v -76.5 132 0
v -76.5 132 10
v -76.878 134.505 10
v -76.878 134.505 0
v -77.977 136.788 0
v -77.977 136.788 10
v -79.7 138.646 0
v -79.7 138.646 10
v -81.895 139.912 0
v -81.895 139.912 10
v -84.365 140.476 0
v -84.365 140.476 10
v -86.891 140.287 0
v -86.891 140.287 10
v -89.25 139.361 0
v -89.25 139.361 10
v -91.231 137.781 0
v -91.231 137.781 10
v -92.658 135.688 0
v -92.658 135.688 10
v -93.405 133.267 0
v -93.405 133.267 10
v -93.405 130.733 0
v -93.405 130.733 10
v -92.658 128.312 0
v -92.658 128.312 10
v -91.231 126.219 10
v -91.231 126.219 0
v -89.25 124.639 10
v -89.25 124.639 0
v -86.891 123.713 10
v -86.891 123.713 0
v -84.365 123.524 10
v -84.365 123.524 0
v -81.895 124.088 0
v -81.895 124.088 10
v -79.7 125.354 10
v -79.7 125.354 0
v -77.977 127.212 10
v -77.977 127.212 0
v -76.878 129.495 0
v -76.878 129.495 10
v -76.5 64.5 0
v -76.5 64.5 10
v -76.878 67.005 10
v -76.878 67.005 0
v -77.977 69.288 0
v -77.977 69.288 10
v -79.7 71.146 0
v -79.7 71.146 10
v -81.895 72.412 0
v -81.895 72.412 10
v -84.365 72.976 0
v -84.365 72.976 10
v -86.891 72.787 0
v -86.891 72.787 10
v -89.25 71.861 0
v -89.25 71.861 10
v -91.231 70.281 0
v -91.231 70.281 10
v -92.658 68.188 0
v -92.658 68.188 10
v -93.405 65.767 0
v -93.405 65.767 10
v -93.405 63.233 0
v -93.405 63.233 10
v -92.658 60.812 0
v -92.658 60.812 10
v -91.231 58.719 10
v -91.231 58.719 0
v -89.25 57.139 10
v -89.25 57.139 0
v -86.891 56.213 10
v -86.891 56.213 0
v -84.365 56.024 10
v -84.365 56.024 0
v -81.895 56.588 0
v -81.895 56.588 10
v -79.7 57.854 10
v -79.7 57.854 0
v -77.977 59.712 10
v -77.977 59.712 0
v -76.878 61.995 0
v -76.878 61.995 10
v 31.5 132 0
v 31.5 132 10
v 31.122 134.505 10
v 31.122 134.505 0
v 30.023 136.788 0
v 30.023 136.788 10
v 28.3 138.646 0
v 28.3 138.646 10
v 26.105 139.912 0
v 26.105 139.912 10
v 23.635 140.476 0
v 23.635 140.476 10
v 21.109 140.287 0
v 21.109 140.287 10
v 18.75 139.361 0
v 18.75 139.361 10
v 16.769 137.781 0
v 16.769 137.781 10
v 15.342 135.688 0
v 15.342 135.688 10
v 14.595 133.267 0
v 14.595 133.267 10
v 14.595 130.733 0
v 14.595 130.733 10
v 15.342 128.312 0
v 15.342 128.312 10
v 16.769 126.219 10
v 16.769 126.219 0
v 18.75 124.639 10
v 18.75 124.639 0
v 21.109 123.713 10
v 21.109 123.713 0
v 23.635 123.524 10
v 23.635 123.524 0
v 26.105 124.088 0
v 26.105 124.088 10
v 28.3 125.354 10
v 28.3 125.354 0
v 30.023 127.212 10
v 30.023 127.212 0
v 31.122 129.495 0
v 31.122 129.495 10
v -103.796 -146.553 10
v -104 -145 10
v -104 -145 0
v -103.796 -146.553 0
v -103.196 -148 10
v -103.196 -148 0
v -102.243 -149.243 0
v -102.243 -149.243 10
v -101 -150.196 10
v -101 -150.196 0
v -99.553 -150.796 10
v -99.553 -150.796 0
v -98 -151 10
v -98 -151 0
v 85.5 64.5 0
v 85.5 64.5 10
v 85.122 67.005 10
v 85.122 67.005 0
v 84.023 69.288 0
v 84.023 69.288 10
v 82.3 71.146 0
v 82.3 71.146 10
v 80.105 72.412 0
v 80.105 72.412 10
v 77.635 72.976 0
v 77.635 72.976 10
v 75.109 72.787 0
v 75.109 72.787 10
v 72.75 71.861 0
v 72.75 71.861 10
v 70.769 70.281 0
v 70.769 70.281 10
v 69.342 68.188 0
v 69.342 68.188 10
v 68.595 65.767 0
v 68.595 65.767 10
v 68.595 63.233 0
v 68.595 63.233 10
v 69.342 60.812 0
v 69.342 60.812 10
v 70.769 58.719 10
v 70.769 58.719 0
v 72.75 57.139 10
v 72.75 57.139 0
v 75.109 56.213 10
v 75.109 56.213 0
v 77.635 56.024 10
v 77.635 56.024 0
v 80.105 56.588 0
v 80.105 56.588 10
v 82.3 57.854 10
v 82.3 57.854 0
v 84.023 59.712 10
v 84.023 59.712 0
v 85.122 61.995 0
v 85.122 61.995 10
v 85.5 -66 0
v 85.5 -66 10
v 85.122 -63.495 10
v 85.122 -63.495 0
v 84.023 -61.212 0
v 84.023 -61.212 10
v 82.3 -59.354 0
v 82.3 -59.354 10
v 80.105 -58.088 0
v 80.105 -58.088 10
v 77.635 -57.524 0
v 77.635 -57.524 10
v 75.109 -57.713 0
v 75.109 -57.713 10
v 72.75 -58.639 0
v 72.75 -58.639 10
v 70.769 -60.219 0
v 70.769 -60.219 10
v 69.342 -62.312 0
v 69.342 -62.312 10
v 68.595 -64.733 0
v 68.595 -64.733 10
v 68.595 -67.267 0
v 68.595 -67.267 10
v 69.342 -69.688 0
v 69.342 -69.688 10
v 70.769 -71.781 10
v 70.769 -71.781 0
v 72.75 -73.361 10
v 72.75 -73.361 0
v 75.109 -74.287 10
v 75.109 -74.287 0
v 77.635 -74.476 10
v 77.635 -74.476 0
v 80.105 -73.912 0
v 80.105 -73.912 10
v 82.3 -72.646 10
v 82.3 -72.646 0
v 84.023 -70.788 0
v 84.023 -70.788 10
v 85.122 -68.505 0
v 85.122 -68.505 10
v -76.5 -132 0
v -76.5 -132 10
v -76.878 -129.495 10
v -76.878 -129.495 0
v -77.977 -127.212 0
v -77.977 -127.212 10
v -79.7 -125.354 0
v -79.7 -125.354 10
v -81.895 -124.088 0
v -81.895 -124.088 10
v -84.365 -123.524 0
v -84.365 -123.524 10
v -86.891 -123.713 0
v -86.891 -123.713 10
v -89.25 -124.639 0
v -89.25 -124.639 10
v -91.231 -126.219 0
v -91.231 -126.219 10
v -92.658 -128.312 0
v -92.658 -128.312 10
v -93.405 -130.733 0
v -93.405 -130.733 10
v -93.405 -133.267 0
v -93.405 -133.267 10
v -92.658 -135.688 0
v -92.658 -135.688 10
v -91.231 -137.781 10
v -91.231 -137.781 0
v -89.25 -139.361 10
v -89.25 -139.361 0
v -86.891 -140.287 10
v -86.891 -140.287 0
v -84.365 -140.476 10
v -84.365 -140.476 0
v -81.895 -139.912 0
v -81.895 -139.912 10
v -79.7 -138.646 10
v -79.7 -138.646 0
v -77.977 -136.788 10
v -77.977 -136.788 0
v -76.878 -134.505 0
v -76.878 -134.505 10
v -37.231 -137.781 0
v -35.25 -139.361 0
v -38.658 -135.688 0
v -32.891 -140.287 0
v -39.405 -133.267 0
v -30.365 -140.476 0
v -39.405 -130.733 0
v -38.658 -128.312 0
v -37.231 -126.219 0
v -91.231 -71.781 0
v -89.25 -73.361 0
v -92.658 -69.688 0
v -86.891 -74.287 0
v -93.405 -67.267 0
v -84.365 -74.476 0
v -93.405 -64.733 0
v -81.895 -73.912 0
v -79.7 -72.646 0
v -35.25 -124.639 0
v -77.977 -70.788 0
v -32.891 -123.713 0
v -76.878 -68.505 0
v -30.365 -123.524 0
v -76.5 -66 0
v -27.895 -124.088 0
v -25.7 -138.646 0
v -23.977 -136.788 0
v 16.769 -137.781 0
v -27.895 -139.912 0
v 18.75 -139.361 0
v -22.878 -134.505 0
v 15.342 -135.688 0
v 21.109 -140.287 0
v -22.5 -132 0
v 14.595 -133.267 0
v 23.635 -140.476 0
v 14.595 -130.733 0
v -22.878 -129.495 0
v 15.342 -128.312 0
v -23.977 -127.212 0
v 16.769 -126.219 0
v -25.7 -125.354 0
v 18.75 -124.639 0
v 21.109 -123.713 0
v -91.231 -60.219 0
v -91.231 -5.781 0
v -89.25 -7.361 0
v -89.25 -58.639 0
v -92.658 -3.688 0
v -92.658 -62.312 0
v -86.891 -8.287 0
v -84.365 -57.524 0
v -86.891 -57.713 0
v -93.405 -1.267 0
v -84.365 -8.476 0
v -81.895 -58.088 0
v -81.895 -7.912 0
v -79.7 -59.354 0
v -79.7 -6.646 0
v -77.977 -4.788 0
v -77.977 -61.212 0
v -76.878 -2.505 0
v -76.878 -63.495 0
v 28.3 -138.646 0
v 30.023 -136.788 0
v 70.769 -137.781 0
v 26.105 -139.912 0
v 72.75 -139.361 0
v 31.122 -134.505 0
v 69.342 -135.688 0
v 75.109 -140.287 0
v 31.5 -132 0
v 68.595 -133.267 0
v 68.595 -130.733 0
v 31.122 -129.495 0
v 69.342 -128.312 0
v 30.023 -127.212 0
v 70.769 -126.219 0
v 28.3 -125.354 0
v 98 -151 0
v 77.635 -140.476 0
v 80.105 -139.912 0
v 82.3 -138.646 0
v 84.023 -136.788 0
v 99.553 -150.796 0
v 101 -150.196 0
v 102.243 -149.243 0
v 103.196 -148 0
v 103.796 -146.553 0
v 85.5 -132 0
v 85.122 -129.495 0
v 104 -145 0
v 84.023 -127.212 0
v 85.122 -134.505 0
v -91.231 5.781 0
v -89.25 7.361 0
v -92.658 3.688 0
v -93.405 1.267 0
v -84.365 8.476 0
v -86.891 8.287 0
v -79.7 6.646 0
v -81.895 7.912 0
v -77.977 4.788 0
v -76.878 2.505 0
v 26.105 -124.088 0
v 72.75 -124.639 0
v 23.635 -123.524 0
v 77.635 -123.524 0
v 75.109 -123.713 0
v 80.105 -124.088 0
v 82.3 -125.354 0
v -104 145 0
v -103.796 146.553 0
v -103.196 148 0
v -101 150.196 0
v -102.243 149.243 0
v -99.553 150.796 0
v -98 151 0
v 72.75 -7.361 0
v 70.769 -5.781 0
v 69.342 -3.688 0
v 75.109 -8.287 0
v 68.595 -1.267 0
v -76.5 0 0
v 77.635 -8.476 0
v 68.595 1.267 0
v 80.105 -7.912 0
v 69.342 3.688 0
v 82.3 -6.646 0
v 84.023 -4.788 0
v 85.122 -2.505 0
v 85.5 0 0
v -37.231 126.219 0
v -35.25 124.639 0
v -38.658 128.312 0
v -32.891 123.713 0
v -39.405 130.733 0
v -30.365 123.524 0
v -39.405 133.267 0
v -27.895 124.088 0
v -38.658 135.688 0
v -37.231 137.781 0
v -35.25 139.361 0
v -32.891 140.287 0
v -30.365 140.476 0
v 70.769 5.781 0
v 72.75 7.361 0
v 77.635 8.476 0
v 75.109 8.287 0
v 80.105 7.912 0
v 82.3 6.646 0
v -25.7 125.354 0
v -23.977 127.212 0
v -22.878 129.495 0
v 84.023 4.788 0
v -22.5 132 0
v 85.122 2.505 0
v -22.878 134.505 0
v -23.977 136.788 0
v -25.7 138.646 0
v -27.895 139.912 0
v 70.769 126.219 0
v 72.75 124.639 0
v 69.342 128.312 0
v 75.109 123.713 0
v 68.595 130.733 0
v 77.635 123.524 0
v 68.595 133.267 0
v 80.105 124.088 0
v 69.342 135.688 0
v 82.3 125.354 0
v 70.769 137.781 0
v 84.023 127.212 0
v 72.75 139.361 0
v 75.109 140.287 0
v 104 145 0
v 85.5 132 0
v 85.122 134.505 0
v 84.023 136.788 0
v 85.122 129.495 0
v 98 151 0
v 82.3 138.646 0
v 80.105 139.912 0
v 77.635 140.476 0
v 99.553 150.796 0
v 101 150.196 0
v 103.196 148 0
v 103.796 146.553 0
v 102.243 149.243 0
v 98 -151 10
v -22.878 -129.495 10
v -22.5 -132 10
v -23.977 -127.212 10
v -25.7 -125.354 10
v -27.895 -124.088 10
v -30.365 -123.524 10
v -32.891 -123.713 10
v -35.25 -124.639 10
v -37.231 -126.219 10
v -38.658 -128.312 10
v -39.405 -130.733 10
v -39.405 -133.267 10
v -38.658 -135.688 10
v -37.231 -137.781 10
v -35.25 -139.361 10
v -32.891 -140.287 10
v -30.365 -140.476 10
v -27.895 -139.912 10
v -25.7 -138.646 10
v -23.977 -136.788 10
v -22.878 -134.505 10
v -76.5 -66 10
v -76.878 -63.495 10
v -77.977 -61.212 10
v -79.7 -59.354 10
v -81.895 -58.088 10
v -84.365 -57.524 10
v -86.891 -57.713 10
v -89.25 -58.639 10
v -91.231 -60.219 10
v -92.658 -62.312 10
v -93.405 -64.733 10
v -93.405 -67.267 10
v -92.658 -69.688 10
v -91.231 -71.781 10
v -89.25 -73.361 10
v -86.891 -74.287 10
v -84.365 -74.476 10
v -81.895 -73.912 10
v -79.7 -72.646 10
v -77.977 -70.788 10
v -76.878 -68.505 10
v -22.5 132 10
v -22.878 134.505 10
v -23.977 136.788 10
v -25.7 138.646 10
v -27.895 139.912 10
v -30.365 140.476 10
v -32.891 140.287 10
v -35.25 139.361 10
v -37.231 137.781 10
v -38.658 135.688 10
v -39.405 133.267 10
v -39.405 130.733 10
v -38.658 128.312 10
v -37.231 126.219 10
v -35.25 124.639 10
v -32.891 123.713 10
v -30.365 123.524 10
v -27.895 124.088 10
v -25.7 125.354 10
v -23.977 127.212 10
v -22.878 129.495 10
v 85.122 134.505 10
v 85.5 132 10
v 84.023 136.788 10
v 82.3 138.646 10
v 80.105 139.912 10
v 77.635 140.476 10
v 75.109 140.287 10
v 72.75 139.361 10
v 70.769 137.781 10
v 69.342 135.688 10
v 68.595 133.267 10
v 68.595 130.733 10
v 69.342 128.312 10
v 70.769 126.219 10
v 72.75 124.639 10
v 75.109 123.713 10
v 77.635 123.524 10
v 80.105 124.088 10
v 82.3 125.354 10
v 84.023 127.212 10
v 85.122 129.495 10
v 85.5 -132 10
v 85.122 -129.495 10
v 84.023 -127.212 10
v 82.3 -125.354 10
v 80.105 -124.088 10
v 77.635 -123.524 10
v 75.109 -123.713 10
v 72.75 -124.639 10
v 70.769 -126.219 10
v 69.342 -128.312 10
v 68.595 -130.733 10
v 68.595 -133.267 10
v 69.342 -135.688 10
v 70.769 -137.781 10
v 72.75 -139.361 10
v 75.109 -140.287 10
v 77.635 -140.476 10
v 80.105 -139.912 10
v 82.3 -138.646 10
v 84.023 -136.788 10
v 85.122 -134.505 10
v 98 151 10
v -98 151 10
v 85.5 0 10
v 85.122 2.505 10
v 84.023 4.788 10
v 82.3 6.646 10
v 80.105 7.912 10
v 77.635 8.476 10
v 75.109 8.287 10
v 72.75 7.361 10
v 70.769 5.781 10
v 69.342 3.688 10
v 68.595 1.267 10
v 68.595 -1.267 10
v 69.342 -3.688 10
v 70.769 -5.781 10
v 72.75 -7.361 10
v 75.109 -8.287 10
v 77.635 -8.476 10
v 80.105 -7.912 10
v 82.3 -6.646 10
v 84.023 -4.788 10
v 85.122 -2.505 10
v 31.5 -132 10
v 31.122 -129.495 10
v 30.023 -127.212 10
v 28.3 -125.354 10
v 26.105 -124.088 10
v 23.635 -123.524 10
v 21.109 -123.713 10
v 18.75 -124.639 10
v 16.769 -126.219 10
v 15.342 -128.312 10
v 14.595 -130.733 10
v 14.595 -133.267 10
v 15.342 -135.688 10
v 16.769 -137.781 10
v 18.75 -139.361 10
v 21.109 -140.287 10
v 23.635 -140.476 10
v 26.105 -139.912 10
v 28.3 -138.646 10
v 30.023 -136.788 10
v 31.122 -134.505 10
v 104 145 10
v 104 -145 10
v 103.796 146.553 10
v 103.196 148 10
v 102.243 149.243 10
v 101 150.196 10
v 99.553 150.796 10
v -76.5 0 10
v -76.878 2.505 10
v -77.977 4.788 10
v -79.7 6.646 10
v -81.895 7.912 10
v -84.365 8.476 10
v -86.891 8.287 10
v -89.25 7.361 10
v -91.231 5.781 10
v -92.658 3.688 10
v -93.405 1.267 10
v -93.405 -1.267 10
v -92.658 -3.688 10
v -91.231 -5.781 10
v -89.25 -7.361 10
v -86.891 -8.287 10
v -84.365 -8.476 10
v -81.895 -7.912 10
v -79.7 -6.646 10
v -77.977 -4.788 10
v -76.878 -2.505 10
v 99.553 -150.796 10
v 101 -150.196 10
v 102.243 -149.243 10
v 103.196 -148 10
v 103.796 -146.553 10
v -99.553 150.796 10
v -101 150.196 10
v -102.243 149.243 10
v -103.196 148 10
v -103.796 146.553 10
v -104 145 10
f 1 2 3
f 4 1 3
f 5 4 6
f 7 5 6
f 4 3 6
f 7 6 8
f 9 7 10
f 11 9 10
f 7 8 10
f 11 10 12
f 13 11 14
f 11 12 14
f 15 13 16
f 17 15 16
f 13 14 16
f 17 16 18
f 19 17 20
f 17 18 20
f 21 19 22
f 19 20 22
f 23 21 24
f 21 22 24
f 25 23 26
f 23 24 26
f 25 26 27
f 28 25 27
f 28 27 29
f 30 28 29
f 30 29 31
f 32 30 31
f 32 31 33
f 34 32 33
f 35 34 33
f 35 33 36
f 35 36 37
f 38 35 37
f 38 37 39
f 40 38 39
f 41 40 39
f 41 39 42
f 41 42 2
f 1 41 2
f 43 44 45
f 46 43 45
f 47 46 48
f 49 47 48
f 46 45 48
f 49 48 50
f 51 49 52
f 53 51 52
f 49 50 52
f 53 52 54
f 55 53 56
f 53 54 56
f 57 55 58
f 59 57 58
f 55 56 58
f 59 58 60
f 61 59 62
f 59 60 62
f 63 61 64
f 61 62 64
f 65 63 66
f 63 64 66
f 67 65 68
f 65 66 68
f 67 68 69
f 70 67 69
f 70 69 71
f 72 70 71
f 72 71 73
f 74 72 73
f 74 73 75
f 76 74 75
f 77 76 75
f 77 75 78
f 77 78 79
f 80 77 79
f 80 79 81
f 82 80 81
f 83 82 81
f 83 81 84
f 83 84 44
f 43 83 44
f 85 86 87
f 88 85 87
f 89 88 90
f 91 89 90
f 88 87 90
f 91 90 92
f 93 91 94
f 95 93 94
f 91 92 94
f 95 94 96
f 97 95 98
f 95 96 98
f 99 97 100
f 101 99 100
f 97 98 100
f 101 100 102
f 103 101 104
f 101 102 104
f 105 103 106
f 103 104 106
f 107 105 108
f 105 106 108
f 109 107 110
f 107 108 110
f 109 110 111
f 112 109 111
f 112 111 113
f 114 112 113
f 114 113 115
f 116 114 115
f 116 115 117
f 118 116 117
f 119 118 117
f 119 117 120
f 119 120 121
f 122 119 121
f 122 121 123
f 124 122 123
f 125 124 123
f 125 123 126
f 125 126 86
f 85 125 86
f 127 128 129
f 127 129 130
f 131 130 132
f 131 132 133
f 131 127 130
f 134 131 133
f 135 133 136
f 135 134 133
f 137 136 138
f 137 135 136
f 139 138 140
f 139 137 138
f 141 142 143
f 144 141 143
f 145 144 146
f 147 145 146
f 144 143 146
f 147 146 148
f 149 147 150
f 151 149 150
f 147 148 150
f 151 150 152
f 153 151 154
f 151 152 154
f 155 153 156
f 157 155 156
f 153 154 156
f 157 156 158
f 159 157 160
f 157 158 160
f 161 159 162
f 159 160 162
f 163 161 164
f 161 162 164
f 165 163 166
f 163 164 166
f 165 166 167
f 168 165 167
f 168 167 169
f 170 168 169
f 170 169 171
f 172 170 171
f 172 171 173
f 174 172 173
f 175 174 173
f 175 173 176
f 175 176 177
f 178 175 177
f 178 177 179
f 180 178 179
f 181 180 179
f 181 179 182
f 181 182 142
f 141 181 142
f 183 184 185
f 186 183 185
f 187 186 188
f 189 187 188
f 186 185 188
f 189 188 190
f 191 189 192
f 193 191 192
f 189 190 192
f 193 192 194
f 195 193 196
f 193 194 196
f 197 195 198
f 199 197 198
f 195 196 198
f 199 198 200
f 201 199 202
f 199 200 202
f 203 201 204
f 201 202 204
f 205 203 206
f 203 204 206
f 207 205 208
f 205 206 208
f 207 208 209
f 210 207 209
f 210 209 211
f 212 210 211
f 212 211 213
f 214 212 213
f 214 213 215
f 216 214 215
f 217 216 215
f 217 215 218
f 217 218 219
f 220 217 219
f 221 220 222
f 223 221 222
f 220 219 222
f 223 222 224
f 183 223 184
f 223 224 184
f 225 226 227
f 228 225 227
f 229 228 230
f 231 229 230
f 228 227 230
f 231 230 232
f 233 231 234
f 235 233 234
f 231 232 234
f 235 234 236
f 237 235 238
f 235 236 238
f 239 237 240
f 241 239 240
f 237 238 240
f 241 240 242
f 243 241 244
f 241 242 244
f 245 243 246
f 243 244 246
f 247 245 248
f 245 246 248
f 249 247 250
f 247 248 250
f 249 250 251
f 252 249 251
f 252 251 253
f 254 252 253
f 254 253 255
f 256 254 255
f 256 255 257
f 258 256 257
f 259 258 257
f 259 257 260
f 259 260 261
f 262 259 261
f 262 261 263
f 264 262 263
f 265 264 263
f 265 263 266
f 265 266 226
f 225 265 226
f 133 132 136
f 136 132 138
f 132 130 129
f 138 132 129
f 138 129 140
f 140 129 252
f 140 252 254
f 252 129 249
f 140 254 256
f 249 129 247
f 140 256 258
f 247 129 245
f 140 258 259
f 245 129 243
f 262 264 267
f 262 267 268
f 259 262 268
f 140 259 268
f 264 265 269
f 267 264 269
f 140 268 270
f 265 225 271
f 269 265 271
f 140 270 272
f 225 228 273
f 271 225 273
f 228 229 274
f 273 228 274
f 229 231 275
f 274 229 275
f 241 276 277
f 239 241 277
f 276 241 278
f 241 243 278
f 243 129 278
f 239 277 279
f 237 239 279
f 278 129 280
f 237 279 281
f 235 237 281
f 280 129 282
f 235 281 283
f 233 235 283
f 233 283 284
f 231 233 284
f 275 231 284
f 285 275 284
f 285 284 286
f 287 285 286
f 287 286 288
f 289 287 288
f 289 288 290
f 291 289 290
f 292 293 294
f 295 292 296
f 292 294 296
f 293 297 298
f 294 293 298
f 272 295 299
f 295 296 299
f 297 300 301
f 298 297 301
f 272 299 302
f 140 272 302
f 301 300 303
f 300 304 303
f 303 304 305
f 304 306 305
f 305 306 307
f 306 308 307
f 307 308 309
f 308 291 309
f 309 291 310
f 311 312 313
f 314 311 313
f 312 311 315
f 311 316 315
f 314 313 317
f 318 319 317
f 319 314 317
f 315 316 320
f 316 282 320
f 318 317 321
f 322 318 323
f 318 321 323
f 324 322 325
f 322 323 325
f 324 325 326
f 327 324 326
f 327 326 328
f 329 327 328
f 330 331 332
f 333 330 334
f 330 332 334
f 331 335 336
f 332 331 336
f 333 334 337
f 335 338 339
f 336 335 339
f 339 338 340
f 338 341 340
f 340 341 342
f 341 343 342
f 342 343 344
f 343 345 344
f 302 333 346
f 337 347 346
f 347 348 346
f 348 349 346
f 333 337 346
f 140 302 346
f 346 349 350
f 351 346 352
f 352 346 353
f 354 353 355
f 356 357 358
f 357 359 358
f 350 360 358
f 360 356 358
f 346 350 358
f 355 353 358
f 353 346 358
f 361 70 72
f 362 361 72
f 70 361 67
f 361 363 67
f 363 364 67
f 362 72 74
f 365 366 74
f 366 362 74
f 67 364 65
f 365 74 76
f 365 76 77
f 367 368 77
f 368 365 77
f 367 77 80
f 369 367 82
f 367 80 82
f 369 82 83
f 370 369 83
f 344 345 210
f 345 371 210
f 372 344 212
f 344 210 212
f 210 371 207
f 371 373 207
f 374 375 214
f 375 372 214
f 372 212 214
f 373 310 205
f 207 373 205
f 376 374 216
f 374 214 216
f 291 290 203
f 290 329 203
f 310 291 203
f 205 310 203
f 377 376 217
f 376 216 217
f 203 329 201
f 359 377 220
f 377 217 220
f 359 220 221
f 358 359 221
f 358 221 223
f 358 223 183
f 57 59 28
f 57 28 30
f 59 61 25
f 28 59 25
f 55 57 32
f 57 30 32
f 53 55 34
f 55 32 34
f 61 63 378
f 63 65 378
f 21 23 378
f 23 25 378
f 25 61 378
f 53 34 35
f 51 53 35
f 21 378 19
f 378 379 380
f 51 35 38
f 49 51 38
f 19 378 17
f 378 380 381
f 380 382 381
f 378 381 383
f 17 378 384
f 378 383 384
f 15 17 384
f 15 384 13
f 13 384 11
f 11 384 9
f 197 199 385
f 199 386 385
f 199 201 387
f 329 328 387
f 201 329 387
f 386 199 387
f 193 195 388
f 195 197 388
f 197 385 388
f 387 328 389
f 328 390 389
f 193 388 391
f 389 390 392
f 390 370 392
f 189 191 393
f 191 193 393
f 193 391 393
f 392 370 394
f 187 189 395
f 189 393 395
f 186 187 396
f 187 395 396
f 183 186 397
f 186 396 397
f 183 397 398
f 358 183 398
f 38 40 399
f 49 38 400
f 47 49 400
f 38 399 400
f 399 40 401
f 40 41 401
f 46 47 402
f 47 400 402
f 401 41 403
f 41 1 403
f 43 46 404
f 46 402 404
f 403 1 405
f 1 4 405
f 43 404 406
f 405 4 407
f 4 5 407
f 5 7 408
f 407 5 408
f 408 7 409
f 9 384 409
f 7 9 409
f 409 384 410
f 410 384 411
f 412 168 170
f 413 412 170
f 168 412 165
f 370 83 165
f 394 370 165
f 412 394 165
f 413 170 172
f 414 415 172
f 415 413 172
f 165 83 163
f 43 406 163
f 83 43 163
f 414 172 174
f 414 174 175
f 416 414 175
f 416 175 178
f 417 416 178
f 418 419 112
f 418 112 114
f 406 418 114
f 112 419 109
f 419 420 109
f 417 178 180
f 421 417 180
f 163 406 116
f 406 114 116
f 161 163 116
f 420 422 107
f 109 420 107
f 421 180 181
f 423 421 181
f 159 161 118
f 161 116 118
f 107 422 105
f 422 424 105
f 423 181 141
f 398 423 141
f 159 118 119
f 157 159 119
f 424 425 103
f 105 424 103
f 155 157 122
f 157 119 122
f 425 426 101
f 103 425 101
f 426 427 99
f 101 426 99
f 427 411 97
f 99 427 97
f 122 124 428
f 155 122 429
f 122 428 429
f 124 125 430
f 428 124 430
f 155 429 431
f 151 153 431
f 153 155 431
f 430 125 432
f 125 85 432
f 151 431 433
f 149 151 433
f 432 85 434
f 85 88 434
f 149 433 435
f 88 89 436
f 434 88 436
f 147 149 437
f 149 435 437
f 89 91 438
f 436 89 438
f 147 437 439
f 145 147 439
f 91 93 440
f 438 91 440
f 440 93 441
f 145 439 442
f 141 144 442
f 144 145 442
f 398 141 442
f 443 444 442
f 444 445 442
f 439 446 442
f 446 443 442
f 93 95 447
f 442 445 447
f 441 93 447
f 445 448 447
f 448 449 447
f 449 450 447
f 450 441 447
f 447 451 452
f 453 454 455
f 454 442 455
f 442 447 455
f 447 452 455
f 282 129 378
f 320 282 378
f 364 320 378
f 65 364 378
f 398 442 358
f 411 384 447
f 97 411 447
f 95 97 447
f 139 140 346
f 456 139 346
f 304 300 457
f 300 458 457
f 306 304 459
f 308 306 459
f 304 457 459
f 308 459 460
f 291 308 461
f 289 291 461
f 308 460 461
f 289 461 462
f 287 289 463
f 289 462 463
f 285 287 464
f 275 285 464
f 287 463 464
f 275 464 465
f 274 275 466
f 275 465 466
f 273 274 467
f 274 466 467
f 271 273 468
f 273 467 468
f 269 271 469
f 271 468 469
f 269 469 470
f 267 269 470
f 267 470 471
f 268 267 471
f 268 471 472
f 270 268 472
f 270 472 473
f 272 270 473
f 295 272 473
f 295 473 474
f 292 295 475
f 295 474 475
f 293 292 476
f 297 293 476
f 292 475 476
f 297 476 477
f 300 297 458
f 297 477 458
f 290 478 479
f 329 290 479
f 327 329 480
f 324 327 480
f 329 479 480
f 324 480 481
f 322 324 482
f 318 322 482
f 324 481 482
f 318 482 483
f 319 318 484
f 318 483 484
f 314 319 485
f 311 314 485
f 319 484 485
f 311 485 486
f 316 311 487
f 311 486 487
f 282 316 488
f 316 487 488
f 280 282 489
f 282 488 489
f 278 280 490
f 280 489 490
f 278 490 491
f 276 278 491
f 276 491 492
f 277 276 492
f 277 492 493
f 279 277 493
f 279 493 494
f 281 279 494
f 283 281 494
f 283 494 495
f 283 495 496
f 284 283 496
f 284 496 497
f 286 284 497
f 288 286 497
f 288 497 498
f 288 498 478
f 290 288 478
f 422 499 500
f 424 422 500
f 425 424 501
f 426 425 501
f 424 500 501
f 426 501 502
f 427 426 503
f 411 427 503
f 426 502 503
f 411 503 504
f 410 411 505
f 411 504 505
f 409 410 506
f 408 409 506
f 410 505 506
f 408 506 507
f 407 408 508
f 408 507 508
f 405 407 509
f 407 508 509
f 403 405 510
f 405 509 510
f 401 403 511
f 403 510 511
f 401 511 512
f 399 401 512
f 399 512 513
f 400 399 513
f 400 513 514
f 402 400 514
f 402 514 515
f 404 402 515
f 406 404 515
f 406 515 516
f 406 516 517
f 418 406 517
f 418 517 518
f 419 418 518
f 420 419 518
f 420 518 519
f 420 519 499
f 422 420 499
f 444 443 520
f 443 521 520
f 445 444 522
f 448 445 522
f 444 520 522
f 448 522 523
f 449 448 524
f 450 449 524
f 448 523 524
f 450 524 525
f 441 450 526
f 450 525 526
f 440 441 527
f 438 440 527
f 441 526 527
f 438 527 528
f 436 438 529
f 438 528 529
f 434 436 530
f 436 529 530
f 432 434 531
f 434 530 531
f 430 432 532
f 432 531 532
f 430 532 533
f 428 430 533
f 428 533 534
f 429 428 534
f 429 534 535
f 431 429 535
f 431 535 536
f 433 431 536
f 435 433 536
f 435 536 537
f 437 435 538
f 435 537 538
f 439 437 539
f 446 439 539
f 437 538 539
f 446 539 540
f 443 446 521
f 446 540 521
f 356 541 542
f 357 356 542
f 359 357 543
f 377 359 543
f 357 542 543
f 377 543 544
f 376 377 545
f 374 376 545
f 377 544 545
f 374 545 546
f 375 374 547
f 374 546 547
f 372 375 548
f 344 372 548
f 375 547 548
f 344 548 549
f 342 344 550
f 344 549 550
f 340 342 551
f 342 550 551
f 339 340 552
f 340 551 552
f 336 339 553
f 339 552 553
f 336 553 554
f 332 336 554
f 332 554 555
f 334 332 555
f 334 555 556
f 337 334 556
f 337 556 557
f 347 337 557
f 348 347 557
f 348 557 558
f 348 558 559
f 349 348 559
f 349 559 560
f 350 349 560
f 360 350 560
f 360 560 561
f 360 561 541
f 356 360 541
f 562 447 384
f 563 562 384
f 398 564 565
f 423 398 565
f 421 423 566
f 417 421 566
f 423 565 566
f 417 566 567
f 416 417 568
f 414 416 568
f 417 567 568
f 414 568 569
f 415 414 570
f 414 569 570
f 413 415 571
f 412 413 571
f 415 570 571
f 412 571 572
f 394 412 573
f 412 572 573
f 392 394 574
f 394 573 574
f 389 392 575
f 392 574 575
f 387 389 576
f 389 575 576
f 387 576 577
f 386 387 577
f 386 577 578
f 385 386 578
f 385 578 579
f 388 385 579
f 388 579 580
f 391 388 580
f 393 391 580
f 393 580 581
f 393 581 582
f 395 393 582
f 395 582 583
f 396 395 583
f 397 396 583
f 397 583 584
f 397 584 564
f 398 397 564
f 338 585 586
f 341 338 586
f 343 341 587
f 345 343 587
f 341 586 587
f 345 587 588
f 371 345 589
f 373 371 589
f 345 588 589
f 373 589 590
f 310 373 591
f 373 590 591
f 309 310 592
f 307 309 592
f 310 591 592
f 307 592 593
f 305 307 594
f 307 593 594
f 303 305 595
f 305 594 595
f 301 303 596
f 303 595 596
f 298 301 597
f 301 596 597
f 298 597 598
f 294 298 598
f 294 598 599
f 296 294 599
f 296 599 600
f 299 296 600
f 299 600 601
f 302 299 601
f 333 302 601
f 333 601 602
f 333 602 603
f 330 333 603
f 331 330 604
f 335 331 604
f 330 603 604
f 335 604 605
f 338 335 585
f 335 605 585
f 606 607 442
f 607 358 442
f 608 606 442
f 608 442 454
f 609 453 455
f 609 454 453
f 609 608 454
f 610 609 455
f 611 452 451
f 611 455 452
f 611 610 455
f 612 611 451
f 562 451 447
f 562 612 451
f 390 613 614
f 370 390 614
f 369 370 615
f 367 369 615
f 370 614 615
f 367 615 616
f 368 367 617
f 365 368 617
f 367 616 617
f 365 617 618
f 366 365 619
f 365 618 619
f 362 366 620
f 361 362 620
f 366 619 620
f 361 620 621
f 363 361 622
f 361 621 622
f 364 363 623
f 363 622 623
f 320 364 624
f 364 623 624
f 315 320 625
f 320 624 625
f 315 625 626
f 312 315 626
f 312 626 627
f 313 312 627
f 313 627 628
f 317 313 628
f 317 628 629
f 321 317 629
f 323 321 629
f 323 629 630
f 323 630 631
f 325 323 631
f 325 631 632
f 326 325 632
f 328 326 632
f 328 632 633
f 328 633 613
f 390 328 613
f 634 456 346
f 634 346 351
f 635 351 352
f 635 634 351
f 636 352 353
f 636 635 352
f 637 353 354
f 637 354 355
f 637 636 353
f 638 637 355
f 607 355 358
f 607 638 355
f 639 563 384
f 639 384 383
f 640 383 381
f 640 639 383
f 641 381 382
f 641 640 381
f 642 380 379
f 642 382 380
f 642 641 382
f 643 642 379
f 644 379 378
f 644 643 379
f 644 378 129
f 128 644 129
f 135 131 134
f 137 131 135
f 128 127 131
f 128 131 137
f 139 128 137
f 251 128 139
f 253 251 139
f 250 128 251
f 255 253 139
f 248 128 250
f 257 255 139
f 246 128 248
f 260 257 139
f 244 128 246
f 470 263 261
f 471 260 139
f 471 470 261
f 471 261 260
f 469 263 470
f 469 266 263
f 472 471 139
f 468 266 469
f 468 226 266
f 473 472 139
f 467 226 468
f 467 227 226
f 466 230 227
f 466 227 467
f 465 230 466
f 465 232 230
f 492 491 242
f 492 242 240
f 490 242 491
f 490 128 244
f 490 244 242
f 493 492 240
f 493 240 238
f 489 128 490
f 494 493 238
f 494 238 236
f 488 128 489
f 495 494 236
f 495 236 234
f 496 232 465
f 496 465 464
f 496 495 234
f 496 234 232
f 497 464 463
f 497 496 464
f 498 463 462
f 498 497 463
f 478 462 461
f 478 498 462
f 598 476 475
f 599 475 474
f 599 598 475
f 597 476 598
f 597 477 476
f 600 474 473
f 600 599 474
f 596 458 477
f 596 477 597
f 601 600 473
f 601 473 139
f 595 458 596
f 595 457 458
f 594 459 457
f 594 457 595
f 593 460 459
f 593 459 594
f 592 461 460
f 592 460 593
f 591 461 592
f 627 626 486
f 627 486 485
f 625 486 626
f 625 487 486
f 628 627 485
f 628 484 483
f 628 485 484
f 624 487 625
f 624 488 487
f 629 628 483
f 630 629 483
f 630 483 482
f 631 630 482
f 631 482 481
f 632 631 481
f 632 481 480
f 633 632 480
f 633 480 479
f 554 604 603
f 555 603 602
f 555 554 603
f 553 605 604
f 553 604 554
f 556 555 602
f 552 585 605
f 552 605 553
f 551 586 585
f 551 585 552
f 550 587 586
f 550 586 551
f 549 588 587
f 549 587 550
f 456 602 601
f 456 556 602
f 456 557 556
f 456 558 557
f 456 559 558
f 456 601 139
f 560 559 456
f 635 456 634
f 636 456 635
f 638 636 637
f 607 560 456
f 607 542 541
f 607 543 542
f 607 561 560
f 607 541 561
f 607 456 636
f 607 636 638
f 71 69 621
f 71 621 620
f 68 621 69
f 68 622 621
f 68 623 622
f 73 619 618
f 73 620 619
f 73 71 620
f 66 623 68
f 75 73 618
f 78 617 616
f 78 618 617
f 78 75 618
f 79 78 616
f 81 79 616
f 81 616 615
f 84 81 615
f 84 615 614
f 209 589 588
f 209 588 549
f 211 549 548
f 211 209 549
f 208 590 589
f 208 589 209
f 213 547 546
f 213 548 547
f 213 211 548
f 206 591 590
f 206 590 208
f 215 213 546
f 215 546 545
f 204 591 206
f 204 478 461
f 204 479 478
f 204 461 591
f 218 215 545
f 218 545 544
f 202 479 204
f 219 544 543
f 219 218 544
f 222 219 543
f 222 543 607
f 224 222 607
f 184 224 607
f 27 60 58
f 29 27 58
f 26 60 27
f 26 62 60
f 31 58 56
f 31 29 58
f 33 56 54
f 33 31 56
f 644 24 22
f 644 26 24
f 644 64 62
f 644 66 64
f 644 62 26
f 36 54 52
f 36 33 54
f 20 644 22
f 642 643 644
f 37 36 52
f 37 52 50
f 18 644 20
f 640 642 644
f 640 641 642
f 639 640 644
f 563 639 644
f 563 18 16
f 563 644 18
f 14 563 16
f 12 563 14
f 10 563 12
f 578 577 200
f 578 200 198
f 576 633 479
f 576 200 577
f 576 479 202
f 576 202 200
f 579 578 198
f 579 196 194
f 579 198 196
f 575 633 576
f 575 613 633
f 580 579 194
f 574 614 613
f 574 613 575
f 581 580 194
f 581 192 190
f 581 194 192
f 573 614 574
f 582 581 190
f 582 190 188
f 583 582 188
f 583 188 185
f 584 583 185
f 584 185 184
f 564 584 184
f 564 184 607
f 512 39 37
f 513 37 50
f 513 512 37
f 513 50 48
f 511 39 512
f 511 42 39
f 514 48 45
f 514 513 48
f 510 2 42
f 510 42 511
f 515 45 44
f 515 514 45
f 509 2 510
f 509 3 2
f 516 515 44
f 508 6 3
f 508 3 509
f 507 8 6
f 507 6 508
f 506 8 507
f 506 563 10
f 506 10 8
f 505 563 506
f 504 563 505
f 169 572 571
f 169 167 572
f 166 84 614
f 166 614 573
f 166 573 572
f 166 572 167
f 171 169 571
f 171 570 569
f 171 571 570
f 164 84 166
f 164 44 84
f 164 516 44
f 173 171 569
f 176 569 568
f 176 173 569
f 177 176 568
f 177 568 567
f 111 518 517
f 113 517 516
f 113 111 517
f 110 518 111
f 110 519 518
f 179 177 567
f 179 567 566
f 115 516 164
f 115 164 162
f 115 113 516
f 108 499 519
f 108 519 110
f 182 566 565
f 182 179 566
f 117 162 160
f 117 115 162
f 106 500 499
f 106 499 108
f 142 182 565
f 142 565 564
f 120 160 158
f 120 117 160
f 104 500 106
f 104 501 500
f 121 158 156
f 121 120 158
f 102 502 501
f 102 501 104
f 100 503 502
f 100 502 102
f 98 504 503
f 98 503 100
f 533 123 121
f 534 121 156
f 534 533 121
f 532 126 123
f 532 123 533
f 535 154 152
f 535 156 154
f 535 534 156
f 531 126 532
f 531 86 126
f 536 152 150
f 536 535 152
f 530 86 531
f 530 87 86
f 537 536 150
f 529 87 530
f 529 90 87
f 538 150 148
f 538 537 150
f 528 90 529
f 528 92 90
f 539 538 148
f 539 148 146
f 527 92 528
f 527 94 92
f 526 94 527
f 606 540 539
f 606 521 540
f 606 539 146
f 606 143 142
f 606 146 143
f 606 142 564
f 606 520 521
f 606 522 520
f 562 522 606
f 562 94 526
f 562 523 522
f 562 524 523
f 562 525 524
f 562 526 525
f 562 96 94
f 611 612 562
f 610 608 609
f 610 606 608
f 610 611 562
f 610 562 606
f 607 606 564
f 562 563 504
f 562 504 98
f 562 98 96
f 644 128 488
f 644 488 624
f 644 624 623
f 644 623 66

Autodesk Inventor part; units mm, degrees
ref_plane "YZ Plane" through (0, 0, 0) normal (1, 0, 0) x (0, 1, 0)
ref_plane "XZ Plane" through (0, 0, 0) normal (0, 1, 0) x (-1, 0, 0)
ref_plane "XY Plane" through (0, 0, 0) normal (0, 0, 1) x (1, 0, 0)
sketch "Sketch2" plane through (0, 0, 0) normal (0, 0, 1) x (1, 0, 0)
  line L0 (-54, -101) -> (54, -101)
  line L1 (54, -101) -> (54, 101)
  line L2 (54, 101) -> (-54, 101)
  line L3 (-54, 101) -> (-54, -101)
  line L4 (-54, -101) -> (54, 101) construction
  line L5 (54, -101) -> (-54, 101) construction
  line L6 (-104, -151) -> (104, -151)
  line L7 (104, -151) -> (104, 151)
  line L8 (104, 151) -> (-104, 151)
  line L9 (-104, 151) -> (-104, -151)
  point P0 (0, 0)
  dimension "d29" = 108
  dimension "d30" = 202
  dimension "d31" = 50
extrude "Plate2" add sketch "Sketch2" along normal blind 10 contours L3 L2 L1 L0 | L9 L8 L7 L6
sketch "Sketch5" plane through (0, 0, 10) normal (0, 0, 1) x (1, 0, 0)
  line L0 (104, -151) -> (-104, -151) construction
  line L1 (104, 151) -> (104, -151) construction
  line L2 (-104, 151) -> (104, 151) construction
  line L3 (-104, -151) -> (-104, 151) construction
  line L4 (-85, 132) -> (85, 132) construction
  line L5 (85, 132) -> (85, -132) construction
  line L6 (85, -132) -> (-85, -132) construction
  line L7 (-85, -132) -> (-85, 132) construction
  circle A0 centre (-85, -132) radius 8.5
  circle A1 centre (-85, 132) radius 8.5
  circle A2 centre (-85, 0) radius 8.5
  circle A3 centre (-85, -66) radius 8.5
  circle A4 centre (-85, 64.5) radius 8.5
  line L8 (-50, -0.75) -> (50, -0.75) construction
  circle A5 centre (-31, -132) radius 8.5
  circle A6 centre (-31, -66) radius 8.5
  circle A7 centre (-31, 0) radius 8.5
  circle A8 centre (-31, 64.5) radius 8.5
  circle A9 centre (-31, 132) radius 8.5
  circle A10 centre (23, -132) radius 8.5
  circle A11 centre (23, -66) radius 8.5
  circle A12 centre (23, 0) radius 8.5
  circle A13 centre (23, 64.5) radius 8.5
  circle A14 centre (23, 132) radius 8.5
  circle A15 centre (77, -132) radius 8.5
  circle A16 centre (77, -66) radius 8.5
  circle A17 centre (77, 0) radius 8.5
  circle A18 centre (77, 64.5) radius 8.5
  circle A19 centre (77, 132) radius 8.5
  point P0 (0, 0)
  point P1 (0, -132)
  dimension "d33" = 17
  dimension "d34" = 19
  dimension "d35" = 66
  dimension "d36" = 66
  dimension "d39" = 54
extrude "Cut3" cut sketch "Sketch5" against normal blind 10 contours A0 | A1 | A2 | A3 | A4 | A5 | A9 | A10 | A14 | A15 | A16 | A17 | A18 | A19
fillet "Corner Round1" radius 6 4 edges at (-104, -151, 5) (-104, 151, 5) (104, 151, 5) (104, -151, 5)
equation "\"d35\" = d36"
equation "\"d44\" = Thickness"
equation "\"d14\" = Thickness"
equation "\"BendReliefDepth\" = 0.5 * Thickness"
equation "\"TransitionRadius\" = BendRadius"
equation "\"JacobiRadiusSize\" = BendRadius"
equation "\"Thickness\" = 10"
equation "\"BendRadius\" = 6"
properties part number "PRS 1200-07 charging flange rect" material "Steel"
